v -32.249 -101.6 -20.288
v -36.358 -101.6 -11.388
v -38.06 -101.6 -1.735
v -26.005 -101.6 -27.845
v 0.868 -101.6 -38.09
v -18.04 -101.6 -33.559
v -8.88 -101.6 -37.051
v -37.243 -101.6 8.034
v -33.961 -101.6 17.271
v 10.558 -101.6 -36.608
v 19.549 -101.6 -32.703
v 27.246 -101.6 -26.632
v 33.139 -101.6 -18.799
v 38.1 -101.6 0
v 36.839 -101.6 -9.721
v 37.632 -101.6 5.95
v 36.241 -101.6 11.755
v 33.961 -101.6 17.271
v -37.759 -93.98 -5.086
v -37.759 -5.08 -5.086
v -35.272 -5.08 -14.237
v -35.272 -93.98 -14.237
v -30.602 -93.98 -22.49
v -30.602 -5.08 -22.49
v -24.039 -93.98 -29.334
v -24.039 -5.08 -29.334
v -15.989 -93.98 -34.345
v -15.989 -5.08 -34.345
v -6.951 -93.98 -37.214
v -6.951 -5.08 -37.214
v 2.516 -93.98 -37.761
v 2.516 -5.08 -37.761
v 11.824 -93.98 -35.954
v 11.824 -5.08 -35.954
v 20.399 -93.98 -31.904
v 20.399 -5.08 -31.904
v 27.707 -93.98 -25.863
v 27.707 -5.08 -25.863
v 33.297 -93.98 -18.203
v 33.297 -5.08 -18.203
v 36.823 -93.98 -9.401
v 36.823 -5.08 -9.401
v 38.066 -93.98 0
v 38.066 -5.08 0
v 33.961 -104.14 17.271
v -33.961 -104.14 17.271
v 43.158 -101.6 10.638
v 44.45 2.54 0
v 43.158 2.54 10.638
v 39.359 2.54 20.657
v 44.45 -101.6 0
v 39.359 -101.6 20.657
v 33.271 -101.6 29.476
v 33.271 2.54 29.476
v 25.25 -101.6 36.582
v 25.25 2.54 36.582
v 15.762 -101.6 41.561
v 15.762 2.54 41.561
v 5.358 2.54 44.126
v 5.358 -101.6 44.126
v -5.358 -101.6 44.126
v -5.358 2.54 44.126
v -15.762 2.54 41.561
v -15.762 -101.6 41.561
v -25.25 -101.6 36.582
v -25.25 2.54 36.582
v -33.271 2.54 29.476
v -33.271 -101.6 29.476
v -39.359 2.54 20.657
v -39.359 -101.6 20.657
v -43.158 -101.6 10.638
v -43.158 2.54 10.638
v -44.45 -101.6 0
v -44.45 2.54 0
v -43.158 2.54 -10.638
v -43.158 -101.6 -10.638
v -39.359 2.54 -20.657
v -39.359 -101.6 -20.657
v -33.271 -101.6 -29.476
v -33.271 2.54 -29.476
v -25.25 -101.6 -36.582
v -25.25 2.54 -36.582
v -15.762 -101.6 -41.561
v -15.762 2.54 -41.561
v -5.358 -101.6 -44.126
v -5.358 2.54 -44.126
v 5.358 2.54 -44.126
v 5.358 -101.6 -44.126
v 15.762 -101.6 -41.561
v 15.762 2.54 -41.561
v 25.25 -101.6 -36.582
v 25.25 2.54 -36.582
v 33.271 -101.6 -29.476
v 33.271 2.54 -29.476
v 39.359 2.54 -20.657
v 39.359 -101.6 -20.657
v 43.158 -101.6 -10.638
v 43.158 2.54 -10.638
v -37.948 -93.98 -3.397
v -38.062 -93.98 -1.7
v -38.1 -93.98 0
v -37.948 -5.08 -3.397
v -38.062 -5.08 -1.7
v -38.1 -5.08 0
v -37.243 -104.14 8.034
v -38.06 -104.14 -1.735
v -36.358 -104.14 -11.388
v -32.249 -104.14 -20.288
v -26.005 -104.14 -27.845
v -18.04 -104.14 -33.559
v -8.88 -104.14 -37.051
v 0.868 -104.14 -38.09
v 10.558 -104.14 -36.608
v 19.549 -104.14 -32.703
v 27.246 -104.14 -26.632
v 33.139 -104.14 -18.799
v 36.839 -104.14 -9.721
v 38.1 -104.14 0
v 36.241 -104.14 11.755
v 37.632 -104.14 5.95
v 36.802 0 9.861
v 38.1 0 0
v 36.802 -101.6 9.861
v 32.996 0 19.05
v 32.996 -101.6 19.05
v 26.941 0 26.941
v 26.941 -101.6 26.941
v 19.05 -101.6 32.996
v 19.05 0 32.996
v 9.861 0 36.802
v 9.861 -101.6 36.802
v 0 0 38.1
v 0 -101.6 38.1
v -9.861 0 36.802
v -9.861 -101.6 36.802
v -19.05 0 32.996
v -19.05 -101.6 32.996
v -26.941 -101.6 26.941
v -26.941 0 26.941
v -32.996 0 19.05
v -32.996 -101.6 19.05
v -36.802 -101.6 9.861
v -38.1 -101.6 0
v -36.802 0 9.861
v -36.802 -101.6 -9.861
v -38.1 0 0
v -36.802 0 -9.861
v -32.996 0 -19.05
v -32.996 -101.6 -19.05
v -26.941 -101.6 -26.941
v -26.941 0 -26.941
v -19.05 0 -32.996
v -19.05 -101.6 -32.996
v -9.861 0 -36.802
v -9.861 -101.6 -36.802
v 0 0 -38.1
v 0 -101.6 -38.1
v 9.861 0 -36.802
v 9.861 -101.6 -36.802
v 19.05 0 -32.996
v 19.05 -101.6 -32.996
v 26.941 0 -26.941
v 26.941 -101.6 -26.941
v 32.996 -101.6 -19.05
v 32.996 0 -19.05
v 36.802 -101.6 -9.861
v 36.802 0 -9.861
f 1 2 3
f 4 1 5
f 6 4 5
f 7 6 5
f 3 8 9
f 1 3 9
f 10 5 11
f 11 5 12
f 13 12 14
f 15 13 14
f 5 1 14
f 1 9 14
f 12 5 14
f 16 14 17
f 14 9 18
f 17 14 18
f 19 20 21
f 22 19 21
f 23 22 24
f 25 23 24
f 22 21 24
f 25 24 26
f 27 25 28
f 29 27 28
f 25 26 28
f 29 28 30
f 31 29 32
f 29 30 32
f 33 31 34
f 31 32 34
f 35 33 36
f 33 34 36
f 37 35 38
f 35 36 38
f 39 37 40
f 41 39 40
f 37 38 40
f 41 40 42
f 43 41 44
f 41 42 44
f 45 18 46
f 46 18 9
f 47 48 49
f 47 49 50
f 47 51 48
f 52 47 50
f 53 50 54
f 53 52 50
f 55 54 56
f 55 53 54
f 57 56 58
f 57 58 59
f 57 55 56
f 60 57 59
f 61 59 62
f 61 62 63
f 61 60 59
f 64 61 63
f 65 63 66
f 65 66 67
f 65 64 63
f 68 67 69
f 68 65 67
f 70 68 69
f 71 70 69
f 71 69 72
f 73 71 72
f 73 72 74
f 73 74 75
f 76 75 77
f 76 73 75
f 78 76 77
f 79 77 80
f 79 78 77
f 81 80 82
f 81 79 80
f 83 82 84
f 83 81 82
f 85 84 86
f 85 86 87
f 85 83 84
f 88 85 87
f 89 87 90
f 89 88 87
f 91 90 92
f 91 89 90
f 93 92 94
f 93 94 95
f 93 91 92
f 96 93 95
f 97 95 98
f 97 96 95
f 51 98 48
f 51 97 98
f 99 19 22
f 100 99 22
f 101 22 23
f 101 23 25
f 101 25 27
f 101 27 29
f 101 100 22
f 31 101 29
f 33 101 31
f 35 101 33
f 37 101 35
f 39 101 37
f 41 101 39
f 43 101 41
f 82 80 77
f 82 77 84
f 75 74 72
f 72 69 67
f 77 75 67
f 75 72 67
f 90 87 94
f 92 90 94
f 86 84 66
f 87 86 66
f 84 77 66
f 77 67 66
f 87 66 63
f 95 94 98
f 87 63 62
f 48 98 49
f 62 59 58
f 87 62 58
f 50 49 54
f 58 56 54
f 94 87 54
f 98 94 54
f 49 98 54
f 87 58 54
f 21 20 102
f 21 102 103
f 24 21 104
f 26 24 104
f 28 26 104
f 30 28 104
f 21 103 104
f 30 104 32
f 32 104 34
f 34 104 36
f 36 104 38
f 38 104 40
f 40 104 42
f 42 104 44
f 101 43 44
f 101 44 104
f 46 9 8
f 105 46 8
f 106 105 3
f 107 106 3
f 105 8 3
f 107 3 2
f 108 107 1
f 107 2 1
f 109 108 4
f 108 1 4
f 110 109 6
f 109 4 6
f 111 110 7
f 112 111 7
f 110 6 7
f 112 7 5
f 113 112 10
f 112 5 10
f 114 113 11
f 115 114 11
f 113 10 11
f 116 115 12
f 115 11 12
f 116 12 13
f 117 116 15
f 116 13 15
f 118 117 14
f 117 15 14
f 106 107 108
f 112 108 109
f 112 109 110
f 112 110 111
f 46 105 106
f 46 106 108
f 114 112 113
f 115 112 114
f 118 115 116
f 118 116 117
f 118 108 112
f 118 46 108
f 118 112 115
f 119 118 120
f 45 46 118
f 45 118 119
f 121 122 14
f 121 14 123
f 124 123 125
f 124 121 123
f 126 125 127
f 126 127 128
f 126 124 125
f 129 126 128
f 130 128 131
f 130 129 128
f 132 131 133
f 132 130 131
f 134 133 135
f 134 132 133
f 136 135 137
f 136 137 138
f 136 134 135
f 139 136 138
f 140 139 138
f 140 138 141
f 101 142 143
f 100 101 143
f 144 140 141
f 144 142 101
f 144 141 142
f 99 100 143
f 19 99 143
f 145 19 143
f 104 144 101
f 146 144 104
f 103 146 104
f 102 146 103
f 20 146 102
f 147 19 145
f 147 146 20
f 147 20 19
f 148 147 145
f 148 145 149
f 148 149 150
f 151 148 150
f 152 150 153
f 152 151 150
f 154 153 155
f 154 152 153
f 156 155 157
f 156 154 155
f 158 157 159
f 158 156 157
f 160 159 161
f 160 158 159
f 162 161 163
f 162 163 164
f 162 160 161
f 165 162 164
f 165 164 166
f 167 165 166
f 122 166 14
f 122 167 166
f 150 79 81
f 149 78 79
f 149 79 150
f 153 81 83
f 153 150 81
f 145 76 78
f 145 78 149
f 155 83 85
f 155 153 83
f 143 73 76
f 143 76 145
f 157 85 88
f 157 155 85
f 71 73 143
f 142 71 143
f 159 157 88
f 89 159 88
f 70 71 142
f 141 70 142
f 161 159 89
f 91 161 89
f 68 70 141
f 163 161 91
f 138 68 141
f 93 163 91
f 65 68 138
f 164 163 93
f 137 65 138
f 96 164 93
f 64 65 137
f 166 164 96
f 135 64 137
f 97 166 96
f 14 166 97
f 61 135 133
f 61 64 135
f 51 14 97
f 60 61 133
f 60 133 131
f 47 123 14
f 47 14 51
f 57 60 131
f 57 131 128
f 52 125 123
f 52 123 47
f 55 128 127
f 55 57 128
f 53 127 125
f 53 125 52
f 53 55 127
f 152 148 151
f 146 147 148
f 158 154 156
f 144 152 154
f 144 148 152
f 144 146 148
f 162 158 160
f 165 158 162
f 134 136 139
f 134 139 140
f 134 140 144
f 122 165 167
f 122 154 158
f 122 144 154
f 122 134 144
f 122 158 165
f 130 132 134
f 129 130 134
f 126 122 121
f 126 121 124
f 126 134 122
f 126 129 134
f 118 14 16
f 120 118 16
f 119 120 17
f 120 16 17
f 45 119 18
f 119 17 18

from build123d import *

# Parameters (mm, degrees)
F0_R     = 44.45
F0_R_2   = 38.1
F1_DEPTH = 101.6
F2_R     = 44.45
F3_DEPTH = 2.54
F6_DEPTH = 88.9
F8_DEPTH = 2.54


with BuildPart() as f1:
    # F0 (on Front) → F1 (new body)
    with BuildSketch(Plane.XZ):
        Circle(F0_R)
        Circle(F0_R_2, mode=Mode.SUBTRACT)
    extrude(amount=F1_DEPTH)

    # F2 (on Front) → F3 (join)
    with BuildSketch(Plane.XZ):
        Circle(F2_R)
    extrude(amount=-F3_DEPTH)

    # F5 (on offset) → F6 (join)
    with BuildSketch(Plane.XZ.offset(5.08)):
        with BuildLine():
            Line((38.065738, 0), (-38.134262, 0))
            ThreePointArc((-38.134262, 0), (-0.034262, -37.846615), (38.065738, 0))
        make_face()
    extrude(amount=F6_DEPTH)


with BuildPart() as f8:
    # F7 (on face) → F8 (new body)
    with BuildSketch(Plane.XZ.offset(101.6)):
        with BuildLine():
            Line((33.960771, 17.27067), (-33.960771, 17.27067))
            ThreePointArc((-33.960771, 17.27067), (-8.879883, -37.050745), (38.1, 0))
            ThreePointArc((38.1, 0), (37.050745, 8.879883), (33.960771, 17.27067))
        make_face()
    extrude(amount=F8_DEPTH)


solid = Compound([f1.part, f8.part])
